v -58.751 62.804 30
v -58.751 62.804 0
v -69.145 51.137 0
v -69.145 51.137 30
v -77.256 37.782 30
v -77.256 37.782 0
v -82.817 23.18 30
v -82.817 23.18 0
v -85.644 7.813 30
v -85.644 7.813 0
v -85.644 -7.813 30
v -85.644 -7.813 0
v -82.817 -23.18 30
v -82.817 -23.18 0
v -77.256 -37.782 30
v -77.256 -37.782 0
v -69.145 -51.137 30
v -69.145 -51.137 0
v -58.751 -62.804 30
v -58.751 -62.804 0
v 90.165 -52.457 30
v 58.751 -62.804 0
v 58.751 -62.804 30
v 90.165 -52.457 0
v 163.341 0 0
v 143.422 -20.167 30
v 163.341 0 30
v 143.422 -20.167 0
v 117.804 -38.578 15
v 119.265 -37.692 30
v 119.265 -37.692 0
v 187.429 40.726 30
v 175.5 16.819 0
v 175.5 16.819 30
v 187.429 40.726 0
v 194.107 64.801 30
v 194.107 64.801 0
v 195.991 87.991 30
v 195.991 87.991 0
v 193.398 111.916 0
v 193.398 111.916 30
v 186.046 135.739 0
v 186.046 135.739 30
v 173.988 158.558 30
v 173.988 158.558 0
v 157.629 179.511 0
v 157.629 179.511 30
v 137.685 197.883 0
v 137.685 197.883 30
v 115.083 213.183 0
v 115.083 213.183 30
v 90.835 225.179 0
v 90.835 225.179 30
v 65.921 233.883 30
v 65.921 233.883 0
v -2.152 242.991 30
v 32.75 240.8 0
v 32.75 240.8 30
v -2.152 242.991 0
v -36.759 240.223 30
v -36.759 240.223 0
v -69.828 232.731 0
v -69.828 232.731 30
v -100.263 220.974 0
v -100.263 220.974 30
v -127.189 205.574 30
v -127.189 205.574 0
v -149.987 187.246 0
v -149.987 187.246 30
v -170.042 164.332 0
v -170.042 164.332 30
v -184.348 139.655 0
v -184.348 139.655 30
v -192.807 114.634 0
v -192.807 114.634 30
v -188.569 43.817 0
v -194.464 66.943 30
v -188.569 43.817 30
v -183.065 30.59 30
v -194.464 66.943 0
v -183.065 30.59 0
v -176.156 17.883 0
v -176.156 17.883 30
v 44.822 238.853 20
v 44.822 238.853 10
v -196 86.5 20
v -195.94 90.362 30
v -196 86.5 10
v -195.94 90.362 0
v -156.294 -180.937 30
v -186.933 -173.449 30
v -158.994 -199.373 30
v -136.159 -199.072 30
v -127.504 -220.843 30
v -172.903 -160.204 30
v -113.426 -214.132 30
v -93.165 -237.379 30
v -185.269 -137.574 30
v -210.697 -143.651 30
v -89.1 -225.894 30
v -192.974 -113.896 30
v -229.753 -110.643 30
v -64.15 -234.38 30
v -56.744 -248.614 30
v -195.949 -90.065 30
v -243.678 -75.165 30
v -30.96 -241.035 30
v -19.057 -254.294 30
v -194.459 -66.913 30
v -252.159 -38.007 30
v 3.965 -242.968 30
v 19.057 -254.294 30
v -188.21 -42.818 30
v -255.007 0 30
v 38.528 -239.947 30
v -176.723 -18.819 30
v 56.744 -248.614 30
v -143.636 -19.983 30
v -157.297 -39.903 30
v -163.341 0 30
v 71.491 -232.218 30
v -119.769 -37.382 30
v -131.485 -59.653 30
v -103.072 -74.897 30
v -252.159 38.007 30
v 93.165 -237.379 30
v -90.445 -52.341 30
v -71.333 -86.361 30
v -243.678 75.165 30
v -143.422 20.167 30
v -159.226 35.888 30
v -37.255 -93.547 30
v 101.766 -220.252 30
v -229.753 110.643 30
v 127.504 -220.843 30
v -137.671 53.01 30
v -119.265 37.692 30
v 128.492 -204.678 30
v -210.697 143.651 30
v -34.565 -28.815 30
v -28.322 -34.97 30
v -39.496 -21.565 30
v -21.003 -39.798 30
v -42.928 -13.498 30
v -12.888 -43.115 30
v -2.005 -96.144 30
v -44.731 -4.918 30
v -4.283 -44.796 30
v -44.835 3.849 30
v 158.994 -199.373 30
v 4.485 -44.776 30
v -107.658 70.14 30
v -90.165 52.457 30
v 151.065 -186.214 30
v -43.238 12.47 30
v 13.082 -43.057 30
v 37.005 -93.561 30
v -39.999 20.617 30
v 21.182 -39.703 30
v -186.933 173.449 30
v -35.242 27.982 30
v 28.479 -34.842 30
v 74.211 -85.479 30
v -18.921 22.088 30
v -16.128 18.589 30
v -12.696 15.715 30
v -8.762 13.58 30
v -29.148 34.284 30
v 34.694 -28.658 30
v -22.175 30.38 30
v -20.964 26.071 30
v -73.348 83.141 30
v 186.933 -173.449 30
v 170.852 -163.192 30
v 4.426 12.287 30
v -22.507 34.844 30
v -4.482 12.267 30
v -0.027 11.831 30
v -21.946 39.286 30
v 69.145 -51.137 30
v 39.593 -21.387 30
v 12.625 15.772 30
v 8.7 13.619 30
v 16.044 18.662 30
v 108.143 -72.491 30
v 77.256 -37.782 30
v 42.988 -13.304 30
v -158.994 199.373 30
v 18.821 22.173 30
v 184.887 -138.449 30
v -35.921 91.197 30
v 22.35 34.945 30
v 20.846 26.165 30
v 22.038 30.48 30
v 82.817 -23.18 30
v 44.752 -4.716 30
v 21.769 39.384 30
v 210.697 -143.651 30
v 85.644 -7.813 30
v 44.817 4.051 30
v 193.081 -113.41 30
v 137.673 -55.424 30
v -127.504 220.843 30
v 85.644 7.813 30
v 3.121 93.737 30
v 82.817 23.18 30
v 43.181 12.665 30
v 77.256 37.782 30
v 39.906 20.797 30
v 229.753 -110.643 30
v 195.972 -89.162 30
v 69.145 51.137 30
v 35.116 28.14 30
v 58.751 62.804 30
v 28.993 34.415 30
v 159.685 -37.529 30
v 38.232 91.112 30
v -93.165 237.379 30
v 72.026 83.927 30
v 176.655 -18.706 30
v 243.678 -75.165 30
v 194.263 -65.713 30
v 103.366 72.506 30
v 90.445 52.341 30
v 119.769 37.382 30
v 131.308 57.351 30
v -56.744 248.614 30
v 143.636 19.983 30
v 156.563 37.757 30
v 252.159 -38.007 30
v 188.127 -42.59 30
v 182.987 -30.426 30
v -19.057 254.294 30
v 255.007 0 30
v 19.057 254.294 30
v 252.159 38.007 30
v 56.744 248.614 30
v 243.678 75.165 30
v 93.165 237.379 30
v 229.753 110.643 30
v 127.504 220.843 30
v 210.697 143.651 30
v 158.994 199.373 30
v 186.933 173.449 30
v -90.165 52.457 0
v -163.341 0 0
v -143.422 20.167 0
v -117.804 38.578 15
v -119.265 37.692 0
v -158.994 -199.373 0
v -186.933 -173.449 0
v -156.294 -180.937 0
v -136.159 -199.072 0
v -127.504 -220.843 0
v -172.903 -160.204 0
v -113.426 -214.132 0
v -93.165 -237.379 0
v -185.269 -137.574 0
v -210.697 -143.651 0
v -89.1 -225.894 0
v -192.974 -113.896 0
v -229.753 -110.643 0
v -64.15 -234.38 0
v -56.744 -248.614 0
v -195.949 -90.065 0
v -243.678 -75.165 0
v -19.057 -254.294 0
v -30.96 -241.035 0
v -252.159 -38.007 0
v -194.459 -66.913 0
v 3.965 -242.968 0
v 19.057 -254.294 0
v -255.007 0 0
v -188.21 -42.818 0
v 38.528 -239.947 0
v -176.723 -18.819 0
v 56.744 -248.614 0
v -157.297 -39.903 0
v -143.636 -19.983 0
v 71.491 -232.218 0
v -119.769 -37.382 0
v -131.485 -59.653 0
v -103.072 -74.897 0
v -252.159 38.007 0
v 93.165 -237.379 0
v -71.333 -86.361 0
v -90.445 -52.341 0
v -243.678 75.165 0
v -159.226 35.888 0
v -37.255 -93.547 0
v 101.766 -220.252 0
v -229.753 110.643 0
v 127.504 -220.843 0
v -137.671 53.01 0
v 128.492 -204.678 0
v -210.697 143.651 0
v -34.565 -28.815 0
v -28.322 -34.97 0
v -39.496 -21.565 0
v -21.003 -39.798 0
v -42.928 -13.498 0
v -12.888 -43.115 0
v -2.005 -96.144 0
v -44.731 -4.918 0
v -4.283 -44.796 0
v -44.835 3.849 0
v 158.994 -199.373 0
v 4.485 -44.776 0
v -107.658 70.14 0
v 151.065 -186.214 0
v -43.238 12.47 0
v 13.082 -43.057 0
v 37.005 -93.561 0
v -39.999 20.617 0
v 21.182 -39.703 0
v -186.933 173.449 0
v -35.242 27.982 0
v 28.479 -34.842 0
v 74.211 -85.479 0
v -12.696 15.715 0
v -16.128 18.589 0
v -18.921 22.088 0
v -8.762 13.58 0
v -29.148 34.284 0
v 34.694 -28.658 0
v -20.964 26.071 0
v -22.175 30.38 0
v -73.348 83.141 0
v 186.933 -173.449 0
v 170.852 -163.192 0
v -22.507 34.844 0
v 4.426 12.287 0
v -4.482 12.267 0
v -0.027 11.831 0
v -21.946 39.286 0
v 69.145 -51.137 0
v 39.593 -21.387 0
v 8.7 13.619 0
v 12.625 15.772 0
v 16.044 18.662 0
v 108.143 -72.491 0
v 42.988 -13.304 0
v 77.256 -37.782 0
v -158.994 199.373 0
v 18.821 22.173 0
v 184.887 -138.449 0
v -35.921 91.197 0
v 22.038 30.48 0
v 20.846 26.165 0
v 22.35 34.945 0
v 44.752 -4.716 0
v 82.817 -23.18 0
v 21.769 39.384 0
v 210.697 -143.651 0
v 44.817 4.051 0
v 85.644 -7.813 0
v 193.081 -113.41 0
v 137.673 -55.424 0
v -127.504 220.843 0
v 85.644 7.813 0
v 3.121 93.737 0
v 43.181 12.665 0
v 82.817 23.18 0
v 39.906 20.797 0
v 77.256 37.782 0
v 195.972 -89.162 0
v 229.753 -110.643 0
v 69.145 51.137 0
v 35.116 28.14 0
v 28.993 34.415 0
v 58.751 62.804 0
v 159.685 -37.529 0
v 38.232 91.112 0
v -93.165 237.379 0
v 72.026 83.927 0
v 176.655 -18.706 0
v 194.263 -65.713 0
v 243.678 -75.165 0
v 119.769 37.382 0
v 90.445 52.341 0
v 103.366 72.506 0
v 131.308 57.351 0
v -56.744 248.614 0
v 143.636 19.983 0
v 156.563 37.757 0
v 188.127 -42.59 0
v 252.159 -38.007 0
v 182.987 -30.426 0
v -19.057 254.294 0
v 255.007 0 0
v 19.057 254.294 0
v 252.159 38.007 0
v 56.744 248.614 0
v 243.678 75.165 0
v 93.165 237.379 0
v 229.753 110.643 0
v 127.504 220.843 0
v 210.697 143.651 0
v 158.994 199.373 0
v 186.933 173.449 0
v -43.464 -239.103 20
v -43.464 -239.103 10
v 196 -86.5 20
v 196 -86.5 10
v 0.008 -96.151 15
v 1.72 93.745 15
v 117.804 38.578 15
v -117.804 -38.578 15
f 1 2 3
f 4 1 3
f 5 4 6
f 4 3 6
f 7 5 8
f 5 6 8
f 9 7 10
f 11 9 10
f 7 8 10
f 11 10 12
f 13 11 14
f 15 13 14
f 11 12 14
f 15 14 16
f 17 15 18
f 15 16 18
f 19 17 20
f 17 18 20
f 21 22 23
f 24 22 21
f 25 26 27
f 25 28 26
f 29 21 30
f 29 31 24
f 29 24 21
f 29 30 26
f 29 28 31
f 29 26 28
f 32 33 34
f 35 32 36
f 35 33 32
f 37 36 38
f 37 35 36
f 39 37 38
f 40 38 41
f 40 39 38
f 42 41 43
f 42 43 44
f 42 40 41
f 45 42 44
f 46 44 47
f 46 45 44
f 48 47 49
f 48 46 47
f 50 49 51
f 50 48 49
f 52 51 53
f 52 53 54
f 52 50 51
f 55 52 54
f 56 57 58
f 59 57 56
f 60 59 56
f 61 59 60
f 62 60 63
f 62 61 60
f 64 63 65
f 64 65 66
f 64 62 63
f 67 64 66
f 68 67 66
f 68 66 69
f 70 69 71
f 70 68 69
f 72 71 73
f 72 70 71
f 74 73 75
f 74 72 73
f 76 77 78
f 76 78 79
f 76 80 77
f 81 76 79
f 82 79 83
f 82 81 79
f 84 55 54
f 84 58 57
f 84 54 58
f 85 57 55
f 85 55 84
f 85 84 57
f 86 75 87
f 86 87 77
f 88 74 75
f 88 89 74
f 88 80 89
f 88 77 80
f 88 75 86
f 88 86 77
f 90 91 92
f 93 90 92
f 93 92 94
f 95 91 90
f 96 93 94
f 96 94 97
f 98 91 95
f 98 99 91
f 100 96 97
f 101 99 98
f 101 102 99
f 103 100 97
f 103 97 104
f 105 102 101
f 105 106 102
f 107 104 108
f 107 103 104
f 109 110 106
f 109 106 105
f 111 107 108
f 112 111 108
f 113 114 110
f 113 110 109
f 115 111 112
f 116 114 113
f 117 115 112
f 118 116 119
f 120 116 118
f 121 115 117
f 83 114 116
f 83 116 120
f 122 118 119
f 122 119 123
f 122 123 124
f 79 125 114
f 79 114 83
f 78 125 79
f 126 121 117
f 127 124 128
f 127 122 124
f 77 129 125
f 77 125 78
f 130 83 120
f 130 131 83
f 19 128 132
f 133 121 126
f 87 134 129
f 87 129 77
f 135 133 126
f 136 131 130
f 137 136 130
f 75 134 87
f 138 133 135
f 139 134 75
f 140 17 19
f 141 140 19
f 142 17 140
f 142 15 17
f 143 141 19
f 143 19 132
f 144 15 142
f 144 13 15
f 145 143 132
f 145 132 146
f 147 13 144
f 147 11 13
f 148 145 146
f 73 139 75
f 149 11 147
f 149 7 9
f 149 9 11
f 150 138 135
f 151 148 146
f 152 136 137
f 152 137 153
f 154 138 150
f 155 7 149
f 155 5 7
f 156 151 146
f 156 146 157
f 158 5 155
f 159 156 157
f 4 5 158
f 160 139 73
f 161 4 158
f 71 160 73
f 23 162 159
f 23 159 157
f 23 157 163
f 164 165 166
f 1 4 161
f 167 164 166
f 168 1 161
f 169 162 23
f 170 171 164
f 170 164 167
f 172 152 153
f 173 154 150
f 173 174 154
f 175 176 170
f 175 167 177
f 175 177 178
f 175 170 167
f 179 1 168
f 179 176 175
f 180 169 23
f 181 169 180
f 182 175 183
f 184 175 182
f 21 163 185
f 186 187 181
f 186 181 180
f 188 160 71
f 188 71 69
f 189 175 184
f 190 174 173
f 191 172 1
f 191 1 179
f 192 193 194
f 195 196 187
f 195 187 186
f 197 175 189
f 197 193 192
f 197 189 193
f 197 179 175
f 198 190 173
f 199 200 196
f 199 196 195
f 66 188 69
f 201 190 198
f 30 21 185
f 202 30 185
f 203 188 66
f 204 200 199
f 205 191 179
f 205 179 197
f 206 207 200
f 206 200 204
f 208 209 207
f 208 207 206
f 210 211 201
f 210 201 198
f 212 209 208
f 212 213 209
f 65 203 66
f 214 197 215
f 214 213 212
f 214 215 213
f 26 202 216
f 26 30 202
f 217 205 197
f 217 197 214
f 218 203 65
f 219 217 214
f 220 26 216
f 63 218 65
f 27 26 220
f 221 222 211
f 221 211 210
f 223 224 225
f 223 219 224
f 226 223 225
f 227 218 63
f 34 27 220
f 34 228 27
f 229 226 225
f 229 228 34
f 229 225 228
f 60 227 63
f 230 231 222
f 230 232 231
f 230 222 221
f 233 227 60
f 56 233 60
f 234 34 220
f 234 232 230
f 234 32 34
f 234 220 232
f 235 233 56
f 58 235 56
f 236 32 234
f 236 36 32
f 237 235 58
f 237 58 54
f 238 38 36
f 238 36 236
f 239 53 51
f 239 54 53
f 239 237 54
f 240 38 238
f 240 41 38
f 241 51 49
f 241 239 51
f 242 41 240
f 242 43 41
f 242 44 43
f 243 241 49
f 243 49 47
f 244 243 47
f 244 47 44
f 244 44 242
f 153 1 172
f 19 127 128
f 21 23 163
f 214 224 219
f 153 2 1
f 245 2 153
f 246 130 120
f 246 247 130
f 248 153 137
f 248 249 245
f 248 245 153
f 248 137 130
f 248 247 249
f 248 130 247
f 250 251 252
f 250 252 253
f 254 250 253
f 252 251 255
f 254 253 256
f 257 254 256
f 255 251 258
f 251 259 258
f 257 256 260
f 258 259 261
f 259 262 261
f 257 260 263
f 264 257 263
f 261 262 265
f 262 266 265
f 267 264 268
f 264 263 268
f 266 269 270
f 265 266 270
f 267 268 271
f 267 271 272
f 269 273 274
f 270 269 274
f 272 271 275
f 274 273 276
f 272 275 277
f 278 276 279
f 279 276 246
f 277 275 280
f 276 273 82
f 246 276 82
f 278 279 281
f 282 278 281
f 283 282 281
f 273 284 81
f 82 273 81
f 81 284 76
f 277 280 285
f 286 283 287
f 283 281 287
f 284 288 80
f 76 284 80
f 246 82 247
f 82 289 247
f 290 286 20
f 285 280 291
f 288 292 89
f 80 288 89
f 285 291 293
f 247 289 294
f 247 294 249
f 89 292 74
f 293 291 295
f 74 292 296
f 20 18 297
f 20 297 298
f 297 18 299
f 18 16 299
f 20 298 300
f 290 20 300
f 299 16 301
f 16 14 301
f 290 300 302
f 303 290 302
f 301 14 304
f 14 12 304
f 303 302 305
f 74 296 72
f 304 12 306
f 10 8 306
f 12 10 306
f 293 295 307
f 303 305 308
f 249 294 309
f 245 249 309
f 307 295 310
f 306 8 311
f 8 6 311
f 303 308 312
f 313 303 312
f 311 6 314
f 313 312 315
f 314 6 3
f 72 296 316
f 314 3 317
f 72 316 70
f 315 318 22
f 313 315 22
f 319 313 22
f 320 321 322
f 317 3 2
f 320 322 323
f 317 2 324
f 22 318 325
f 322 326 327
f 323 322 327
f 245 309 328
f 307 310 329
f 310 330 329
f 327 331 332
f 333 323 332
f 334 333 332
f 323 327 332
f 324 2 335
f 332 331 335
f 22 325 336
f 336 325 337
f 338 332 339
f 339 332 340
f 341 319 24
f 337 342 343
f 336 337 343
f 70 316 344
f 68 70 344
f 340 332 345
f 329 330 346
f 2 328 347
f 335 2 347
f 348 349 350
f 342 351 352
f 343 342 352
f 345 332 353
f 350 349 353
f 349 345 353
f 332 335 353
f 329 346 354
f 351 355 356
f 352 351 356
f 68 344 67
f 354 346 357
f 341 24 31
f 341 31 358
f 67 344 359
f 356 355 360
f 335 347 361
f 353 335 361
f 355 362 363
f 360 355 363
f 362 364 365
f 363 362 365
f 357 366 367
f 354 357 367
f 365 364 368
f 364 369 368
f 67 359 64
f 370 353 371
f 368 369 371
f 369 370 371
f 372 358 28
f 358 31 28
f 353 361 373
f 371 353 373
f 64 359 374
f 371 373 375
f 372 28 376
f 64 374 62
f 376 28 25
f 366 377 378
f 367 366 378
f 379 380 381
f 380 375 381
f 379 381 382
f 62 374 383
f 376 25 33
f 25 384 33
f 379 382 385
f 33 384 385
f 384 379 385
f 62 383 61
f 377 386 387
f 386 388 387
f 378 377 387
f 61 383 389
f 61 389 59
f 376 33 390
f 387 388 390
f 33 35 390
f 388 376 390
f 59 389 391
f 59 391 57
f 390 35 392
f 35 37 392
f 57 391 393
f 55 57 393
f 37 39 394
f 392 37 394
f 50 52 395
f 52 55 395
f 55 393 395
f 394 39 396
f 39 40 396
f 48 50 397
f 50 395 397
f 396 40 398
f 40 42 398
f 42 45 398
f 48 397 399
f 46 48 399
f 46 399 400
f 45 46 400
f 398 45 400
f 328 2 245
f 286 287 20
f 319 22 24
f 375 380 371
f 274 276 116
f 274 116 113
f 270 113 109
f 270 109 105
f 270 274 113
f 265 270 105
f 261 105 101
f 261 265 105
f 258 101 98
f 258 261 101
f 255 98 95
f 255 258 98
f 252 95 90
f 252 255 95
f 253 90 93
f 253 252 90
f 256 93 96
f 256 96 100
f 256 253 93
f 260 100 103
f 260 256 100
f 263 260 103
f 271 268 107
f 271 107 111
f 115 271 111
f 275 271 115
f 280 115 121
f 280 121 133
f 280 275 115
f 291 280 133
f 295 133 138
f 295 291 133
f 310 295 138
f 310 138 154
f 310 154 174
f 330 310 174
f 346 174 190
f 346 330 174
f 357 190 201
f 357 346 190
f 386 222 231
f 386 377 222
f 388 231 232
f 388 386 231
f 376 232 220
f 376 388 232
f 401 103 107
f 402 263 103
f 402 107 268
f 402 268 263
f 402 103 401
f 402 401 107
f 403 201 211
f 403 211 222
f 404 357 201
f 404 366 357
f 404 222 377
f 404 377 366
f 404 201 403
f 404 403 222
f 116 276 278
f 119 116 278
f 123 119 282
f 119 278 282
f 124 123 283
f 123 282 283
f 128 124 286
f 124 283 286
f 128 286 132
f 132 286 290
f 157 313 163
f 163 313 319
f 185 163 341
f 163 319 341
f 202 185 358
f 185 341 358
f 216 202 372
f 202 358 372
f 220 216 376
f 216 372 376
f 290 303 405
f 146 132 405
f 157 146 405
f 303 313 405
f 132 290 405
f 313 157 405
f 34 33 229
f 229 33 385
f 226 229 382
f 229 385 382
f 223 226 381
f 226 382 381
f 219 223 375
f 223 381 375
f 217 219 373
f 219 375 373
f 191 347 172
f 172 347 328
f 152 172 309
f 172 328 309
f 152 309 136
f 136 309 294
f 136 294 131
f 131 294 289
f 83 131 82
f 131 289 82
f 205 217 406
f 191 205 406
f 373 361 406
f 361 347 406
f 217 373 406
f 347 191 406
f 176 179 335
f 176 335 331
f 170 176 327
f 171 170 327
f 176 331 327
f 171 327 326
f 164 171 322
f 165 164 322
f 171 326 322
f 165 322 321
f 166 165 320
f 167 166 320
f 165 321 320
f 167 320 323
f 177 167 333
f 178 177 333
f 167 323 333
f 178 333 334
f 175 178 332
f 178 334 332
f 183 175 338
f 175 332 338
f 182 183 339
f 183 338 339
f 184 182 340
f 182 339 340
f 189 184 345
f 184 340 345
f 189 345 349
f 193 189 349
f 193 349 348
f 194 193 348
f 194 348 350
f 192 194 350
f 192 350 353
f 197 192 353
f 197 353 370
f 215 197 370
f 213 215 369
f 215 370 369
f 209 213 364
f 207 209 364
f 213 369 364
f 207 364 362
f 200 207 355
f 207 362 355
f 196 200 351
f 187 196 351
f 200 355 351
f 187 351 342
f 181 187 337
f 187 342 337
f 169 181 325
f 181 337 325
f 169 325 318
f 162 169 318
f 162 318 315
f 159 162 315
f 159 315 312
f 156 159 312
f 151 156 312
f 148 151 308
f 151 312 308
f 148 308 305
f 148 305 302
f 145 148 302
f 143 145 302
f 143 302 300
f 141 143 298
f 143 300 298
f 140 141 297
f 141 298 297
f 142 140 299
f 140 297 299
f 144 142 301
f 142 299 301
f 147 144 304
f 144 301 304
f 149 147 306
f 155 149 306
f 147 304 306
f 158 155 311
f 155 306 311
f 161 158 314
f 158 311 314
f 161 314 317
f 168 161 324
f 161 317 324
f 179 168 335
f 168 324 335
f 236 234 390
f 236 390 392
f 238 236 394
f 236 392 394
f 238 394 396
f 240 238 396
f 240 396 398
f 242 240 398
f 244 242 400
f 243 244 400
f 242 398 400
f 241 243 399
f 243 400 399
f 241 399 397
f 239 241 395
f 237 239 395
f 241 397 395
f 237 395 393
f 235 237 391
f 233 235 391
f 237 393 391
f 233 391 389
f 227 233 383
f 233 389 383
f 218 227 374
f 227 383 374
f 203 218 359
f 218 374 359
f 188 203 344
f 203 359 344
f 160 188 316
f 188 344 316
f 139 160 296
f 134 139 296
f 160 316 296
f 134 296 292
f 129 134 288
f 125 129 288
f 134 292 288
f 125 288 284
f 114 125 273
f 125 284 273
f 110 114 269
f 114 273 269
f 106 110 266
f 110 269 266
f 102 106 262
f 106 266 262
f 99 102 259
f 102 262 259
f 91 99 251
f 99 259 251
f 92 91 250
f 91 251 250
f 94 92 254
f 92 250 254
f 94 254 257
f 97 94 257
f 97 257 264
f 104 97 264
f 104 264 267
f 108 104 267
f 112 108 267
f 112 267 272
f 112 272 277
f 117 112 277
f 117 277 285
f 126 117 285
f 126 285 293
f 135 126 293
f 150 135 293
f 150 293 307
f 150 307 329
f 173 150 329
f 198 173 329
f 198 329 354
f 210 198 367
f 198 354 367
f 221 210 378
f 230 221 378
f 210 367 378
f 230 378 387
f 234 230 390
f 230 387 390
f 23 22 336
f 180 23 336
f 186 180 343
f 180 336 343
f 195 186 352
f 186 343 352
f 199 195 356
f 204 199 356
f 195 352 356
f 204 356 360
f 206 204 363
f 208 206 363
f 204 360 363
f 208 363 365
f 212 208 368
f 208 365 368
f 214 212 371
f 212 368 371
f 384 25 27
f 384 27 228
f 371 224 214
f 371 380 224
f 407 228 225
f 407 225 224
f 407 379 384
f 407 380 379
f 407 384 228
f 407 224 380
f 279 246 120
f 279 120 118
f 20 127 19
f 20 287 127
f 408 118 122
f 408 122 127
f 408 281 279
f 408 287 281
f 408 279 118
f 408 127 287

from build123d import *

# Parameters (mm, degrees)
SKETCH_1_R      = 255.007073506
EXTRUDE_1_DEPTH = 30


with BuildPart() as part:
    # Sketch 1 → Extrude 1 (new body)
    with BuildSketch(Plane.XY):
        Circle(SKETCH_1_R)
        with BuildLine():
            add(Edge.make_bspline(
                [(-58.751055362, 62.803769743), (-124.97390961, 46.189956075), (-163.34050211, 0)],
                knots=[1.875227216, 1.875227216, 1.875227216, 2.555973281, 2.555973281, 2.555973281], degree=2, weights=[1, 0.942630199, 1]))
            ThreePointArc((-58.751055362, 62.803769743), (-86, 0), (-58.751055362, -62.803769743))
            add(Edge.make_bspline(
                [(-163.34050211, 0), (-124.97390961, -46.189956075), (-58.751055362, -62.803769743)],
                knots=[0.585619373, 0.585619373, 0.585619373, 1.266365437, 1.266365437, 1.266365437], degree=2, weights=[1, 0.942630199, 1]))
        make_face(mode=Mode.SUBTRACT)
        with BuildLine():
            ThreePointArc((58.751055362, -62.803769743), (86, 0), (58.751055362, 62.803769743))
            add(Edge.make_bspline(
                [(163.34050211, 0), (124.97390961, 46.189956075), (58.751055362, 62.803769743)],
                knots=[0.585619373, 0.585619373, 0.585619373, 1.266365437, 1.266365437, 1.266365437], degree=2, weights=[1, 0.942630199, 1]))
            add(Edge.make_bspline(
                [(58.751055362, -62.803769743), (124.97390961, -46.189956075), (163.34050211, 0)],
                knots=[1.875227216, 1.875227216, 1.875227216, 2.555973281, 2.555973281, 2.555973281], degree=2, weights=[1, 0.942630199, 1]))
        make_face(mode=Mode.SUBTRACT)
        with BuildLine():
            add(Edge.make_bspline(
                [(196, -86.5), (196, -50.843298634), (176.655344593, -18.70581462)],
                knots=[0, 0, 0, 0.448028749, 0.448028749, 0.448028749], degree=2, weights=[1, 0.975013533, 1]))
            add(Edge.make_bspline(
                [(-176.723140988, -18.818560865), (-282.928296502, -195.620073949), (-43.464148251, -239.103497414), (196, -282.58692088), (196, -86.5)],
                knots=[2.694363064, 2.694363064, 2.694363064, 4.488774186, 4.488774186, 6.283185307, 6.283185307, 6.283185307], degree=2, weights=[1, 0.623796498, 1, 0.623796498, 1]))
            add(Edge.make_bspline(
                [(-176.723140988, -18.818560865), (0.091215786, -248.766222331), (176.655344593, -18.70581462)],
                knots=[3.673803124, 3.673803124, 3.673803124, 5.751808031, 5.751808031, 5.751808031], degree=2, weights=[1, 0.507080293, 1]))
        make_face(mode=Mode.SUBTRACT)
        with BuildLine():
            add(Edge.make_bspline(
                [(175.499994085, 16.818952725), (285.643752257, 193.682718887), (44.821876129, 238.852896014), (-196, 284.02307314), (-196, 86.5)],
                knots=[2.680143332, 2.680143332, 2.680143332, 4.48166432, 4.48166432, 6.283185307, 6.283185307, 6.283185307], degree=2, weights=[1, 0.621014073, 1, 0.621014073, 1]))
            add(Edge.make_bspline(
                [(175.499994085, 16.818952725), (5.708014638, 242.49666802), (-176.156401015, 17.883077152)],
                knots=[3.636825053, 3.636825053, 3.636825053, 5.699736109, 5.699736109, 5.699736109], degree=2, weights=[1, 0.513570478, 1]))
            add(Edge.make_bspline(
                [(-196, 86.5), (-196, 50.362191161), (-176.156401015, 17.883077152)],
                knots=[0, 0, 0, 0.45386977, 0.45386977, 0.45386977], degree=2, weights=[1, 0.974360598, 1]))
        make_face(mode=Mode.SUBTRACT)
        with BuildLine():
            ThreePointArc((-21.946440501, 39.285541225), (-0.026653996, 11.830755357), (21.769202582, 39.384029999))
            ThreePointArc((21.769202582, 39.384029999), (0.101382097, -44.999885796), (-21.946440501, 39.285541225))
        make_face(mode=Mode.SUBTRACT)
    extrude(amount=EXTRUDE_1_DEPTH)


solid = part.part
